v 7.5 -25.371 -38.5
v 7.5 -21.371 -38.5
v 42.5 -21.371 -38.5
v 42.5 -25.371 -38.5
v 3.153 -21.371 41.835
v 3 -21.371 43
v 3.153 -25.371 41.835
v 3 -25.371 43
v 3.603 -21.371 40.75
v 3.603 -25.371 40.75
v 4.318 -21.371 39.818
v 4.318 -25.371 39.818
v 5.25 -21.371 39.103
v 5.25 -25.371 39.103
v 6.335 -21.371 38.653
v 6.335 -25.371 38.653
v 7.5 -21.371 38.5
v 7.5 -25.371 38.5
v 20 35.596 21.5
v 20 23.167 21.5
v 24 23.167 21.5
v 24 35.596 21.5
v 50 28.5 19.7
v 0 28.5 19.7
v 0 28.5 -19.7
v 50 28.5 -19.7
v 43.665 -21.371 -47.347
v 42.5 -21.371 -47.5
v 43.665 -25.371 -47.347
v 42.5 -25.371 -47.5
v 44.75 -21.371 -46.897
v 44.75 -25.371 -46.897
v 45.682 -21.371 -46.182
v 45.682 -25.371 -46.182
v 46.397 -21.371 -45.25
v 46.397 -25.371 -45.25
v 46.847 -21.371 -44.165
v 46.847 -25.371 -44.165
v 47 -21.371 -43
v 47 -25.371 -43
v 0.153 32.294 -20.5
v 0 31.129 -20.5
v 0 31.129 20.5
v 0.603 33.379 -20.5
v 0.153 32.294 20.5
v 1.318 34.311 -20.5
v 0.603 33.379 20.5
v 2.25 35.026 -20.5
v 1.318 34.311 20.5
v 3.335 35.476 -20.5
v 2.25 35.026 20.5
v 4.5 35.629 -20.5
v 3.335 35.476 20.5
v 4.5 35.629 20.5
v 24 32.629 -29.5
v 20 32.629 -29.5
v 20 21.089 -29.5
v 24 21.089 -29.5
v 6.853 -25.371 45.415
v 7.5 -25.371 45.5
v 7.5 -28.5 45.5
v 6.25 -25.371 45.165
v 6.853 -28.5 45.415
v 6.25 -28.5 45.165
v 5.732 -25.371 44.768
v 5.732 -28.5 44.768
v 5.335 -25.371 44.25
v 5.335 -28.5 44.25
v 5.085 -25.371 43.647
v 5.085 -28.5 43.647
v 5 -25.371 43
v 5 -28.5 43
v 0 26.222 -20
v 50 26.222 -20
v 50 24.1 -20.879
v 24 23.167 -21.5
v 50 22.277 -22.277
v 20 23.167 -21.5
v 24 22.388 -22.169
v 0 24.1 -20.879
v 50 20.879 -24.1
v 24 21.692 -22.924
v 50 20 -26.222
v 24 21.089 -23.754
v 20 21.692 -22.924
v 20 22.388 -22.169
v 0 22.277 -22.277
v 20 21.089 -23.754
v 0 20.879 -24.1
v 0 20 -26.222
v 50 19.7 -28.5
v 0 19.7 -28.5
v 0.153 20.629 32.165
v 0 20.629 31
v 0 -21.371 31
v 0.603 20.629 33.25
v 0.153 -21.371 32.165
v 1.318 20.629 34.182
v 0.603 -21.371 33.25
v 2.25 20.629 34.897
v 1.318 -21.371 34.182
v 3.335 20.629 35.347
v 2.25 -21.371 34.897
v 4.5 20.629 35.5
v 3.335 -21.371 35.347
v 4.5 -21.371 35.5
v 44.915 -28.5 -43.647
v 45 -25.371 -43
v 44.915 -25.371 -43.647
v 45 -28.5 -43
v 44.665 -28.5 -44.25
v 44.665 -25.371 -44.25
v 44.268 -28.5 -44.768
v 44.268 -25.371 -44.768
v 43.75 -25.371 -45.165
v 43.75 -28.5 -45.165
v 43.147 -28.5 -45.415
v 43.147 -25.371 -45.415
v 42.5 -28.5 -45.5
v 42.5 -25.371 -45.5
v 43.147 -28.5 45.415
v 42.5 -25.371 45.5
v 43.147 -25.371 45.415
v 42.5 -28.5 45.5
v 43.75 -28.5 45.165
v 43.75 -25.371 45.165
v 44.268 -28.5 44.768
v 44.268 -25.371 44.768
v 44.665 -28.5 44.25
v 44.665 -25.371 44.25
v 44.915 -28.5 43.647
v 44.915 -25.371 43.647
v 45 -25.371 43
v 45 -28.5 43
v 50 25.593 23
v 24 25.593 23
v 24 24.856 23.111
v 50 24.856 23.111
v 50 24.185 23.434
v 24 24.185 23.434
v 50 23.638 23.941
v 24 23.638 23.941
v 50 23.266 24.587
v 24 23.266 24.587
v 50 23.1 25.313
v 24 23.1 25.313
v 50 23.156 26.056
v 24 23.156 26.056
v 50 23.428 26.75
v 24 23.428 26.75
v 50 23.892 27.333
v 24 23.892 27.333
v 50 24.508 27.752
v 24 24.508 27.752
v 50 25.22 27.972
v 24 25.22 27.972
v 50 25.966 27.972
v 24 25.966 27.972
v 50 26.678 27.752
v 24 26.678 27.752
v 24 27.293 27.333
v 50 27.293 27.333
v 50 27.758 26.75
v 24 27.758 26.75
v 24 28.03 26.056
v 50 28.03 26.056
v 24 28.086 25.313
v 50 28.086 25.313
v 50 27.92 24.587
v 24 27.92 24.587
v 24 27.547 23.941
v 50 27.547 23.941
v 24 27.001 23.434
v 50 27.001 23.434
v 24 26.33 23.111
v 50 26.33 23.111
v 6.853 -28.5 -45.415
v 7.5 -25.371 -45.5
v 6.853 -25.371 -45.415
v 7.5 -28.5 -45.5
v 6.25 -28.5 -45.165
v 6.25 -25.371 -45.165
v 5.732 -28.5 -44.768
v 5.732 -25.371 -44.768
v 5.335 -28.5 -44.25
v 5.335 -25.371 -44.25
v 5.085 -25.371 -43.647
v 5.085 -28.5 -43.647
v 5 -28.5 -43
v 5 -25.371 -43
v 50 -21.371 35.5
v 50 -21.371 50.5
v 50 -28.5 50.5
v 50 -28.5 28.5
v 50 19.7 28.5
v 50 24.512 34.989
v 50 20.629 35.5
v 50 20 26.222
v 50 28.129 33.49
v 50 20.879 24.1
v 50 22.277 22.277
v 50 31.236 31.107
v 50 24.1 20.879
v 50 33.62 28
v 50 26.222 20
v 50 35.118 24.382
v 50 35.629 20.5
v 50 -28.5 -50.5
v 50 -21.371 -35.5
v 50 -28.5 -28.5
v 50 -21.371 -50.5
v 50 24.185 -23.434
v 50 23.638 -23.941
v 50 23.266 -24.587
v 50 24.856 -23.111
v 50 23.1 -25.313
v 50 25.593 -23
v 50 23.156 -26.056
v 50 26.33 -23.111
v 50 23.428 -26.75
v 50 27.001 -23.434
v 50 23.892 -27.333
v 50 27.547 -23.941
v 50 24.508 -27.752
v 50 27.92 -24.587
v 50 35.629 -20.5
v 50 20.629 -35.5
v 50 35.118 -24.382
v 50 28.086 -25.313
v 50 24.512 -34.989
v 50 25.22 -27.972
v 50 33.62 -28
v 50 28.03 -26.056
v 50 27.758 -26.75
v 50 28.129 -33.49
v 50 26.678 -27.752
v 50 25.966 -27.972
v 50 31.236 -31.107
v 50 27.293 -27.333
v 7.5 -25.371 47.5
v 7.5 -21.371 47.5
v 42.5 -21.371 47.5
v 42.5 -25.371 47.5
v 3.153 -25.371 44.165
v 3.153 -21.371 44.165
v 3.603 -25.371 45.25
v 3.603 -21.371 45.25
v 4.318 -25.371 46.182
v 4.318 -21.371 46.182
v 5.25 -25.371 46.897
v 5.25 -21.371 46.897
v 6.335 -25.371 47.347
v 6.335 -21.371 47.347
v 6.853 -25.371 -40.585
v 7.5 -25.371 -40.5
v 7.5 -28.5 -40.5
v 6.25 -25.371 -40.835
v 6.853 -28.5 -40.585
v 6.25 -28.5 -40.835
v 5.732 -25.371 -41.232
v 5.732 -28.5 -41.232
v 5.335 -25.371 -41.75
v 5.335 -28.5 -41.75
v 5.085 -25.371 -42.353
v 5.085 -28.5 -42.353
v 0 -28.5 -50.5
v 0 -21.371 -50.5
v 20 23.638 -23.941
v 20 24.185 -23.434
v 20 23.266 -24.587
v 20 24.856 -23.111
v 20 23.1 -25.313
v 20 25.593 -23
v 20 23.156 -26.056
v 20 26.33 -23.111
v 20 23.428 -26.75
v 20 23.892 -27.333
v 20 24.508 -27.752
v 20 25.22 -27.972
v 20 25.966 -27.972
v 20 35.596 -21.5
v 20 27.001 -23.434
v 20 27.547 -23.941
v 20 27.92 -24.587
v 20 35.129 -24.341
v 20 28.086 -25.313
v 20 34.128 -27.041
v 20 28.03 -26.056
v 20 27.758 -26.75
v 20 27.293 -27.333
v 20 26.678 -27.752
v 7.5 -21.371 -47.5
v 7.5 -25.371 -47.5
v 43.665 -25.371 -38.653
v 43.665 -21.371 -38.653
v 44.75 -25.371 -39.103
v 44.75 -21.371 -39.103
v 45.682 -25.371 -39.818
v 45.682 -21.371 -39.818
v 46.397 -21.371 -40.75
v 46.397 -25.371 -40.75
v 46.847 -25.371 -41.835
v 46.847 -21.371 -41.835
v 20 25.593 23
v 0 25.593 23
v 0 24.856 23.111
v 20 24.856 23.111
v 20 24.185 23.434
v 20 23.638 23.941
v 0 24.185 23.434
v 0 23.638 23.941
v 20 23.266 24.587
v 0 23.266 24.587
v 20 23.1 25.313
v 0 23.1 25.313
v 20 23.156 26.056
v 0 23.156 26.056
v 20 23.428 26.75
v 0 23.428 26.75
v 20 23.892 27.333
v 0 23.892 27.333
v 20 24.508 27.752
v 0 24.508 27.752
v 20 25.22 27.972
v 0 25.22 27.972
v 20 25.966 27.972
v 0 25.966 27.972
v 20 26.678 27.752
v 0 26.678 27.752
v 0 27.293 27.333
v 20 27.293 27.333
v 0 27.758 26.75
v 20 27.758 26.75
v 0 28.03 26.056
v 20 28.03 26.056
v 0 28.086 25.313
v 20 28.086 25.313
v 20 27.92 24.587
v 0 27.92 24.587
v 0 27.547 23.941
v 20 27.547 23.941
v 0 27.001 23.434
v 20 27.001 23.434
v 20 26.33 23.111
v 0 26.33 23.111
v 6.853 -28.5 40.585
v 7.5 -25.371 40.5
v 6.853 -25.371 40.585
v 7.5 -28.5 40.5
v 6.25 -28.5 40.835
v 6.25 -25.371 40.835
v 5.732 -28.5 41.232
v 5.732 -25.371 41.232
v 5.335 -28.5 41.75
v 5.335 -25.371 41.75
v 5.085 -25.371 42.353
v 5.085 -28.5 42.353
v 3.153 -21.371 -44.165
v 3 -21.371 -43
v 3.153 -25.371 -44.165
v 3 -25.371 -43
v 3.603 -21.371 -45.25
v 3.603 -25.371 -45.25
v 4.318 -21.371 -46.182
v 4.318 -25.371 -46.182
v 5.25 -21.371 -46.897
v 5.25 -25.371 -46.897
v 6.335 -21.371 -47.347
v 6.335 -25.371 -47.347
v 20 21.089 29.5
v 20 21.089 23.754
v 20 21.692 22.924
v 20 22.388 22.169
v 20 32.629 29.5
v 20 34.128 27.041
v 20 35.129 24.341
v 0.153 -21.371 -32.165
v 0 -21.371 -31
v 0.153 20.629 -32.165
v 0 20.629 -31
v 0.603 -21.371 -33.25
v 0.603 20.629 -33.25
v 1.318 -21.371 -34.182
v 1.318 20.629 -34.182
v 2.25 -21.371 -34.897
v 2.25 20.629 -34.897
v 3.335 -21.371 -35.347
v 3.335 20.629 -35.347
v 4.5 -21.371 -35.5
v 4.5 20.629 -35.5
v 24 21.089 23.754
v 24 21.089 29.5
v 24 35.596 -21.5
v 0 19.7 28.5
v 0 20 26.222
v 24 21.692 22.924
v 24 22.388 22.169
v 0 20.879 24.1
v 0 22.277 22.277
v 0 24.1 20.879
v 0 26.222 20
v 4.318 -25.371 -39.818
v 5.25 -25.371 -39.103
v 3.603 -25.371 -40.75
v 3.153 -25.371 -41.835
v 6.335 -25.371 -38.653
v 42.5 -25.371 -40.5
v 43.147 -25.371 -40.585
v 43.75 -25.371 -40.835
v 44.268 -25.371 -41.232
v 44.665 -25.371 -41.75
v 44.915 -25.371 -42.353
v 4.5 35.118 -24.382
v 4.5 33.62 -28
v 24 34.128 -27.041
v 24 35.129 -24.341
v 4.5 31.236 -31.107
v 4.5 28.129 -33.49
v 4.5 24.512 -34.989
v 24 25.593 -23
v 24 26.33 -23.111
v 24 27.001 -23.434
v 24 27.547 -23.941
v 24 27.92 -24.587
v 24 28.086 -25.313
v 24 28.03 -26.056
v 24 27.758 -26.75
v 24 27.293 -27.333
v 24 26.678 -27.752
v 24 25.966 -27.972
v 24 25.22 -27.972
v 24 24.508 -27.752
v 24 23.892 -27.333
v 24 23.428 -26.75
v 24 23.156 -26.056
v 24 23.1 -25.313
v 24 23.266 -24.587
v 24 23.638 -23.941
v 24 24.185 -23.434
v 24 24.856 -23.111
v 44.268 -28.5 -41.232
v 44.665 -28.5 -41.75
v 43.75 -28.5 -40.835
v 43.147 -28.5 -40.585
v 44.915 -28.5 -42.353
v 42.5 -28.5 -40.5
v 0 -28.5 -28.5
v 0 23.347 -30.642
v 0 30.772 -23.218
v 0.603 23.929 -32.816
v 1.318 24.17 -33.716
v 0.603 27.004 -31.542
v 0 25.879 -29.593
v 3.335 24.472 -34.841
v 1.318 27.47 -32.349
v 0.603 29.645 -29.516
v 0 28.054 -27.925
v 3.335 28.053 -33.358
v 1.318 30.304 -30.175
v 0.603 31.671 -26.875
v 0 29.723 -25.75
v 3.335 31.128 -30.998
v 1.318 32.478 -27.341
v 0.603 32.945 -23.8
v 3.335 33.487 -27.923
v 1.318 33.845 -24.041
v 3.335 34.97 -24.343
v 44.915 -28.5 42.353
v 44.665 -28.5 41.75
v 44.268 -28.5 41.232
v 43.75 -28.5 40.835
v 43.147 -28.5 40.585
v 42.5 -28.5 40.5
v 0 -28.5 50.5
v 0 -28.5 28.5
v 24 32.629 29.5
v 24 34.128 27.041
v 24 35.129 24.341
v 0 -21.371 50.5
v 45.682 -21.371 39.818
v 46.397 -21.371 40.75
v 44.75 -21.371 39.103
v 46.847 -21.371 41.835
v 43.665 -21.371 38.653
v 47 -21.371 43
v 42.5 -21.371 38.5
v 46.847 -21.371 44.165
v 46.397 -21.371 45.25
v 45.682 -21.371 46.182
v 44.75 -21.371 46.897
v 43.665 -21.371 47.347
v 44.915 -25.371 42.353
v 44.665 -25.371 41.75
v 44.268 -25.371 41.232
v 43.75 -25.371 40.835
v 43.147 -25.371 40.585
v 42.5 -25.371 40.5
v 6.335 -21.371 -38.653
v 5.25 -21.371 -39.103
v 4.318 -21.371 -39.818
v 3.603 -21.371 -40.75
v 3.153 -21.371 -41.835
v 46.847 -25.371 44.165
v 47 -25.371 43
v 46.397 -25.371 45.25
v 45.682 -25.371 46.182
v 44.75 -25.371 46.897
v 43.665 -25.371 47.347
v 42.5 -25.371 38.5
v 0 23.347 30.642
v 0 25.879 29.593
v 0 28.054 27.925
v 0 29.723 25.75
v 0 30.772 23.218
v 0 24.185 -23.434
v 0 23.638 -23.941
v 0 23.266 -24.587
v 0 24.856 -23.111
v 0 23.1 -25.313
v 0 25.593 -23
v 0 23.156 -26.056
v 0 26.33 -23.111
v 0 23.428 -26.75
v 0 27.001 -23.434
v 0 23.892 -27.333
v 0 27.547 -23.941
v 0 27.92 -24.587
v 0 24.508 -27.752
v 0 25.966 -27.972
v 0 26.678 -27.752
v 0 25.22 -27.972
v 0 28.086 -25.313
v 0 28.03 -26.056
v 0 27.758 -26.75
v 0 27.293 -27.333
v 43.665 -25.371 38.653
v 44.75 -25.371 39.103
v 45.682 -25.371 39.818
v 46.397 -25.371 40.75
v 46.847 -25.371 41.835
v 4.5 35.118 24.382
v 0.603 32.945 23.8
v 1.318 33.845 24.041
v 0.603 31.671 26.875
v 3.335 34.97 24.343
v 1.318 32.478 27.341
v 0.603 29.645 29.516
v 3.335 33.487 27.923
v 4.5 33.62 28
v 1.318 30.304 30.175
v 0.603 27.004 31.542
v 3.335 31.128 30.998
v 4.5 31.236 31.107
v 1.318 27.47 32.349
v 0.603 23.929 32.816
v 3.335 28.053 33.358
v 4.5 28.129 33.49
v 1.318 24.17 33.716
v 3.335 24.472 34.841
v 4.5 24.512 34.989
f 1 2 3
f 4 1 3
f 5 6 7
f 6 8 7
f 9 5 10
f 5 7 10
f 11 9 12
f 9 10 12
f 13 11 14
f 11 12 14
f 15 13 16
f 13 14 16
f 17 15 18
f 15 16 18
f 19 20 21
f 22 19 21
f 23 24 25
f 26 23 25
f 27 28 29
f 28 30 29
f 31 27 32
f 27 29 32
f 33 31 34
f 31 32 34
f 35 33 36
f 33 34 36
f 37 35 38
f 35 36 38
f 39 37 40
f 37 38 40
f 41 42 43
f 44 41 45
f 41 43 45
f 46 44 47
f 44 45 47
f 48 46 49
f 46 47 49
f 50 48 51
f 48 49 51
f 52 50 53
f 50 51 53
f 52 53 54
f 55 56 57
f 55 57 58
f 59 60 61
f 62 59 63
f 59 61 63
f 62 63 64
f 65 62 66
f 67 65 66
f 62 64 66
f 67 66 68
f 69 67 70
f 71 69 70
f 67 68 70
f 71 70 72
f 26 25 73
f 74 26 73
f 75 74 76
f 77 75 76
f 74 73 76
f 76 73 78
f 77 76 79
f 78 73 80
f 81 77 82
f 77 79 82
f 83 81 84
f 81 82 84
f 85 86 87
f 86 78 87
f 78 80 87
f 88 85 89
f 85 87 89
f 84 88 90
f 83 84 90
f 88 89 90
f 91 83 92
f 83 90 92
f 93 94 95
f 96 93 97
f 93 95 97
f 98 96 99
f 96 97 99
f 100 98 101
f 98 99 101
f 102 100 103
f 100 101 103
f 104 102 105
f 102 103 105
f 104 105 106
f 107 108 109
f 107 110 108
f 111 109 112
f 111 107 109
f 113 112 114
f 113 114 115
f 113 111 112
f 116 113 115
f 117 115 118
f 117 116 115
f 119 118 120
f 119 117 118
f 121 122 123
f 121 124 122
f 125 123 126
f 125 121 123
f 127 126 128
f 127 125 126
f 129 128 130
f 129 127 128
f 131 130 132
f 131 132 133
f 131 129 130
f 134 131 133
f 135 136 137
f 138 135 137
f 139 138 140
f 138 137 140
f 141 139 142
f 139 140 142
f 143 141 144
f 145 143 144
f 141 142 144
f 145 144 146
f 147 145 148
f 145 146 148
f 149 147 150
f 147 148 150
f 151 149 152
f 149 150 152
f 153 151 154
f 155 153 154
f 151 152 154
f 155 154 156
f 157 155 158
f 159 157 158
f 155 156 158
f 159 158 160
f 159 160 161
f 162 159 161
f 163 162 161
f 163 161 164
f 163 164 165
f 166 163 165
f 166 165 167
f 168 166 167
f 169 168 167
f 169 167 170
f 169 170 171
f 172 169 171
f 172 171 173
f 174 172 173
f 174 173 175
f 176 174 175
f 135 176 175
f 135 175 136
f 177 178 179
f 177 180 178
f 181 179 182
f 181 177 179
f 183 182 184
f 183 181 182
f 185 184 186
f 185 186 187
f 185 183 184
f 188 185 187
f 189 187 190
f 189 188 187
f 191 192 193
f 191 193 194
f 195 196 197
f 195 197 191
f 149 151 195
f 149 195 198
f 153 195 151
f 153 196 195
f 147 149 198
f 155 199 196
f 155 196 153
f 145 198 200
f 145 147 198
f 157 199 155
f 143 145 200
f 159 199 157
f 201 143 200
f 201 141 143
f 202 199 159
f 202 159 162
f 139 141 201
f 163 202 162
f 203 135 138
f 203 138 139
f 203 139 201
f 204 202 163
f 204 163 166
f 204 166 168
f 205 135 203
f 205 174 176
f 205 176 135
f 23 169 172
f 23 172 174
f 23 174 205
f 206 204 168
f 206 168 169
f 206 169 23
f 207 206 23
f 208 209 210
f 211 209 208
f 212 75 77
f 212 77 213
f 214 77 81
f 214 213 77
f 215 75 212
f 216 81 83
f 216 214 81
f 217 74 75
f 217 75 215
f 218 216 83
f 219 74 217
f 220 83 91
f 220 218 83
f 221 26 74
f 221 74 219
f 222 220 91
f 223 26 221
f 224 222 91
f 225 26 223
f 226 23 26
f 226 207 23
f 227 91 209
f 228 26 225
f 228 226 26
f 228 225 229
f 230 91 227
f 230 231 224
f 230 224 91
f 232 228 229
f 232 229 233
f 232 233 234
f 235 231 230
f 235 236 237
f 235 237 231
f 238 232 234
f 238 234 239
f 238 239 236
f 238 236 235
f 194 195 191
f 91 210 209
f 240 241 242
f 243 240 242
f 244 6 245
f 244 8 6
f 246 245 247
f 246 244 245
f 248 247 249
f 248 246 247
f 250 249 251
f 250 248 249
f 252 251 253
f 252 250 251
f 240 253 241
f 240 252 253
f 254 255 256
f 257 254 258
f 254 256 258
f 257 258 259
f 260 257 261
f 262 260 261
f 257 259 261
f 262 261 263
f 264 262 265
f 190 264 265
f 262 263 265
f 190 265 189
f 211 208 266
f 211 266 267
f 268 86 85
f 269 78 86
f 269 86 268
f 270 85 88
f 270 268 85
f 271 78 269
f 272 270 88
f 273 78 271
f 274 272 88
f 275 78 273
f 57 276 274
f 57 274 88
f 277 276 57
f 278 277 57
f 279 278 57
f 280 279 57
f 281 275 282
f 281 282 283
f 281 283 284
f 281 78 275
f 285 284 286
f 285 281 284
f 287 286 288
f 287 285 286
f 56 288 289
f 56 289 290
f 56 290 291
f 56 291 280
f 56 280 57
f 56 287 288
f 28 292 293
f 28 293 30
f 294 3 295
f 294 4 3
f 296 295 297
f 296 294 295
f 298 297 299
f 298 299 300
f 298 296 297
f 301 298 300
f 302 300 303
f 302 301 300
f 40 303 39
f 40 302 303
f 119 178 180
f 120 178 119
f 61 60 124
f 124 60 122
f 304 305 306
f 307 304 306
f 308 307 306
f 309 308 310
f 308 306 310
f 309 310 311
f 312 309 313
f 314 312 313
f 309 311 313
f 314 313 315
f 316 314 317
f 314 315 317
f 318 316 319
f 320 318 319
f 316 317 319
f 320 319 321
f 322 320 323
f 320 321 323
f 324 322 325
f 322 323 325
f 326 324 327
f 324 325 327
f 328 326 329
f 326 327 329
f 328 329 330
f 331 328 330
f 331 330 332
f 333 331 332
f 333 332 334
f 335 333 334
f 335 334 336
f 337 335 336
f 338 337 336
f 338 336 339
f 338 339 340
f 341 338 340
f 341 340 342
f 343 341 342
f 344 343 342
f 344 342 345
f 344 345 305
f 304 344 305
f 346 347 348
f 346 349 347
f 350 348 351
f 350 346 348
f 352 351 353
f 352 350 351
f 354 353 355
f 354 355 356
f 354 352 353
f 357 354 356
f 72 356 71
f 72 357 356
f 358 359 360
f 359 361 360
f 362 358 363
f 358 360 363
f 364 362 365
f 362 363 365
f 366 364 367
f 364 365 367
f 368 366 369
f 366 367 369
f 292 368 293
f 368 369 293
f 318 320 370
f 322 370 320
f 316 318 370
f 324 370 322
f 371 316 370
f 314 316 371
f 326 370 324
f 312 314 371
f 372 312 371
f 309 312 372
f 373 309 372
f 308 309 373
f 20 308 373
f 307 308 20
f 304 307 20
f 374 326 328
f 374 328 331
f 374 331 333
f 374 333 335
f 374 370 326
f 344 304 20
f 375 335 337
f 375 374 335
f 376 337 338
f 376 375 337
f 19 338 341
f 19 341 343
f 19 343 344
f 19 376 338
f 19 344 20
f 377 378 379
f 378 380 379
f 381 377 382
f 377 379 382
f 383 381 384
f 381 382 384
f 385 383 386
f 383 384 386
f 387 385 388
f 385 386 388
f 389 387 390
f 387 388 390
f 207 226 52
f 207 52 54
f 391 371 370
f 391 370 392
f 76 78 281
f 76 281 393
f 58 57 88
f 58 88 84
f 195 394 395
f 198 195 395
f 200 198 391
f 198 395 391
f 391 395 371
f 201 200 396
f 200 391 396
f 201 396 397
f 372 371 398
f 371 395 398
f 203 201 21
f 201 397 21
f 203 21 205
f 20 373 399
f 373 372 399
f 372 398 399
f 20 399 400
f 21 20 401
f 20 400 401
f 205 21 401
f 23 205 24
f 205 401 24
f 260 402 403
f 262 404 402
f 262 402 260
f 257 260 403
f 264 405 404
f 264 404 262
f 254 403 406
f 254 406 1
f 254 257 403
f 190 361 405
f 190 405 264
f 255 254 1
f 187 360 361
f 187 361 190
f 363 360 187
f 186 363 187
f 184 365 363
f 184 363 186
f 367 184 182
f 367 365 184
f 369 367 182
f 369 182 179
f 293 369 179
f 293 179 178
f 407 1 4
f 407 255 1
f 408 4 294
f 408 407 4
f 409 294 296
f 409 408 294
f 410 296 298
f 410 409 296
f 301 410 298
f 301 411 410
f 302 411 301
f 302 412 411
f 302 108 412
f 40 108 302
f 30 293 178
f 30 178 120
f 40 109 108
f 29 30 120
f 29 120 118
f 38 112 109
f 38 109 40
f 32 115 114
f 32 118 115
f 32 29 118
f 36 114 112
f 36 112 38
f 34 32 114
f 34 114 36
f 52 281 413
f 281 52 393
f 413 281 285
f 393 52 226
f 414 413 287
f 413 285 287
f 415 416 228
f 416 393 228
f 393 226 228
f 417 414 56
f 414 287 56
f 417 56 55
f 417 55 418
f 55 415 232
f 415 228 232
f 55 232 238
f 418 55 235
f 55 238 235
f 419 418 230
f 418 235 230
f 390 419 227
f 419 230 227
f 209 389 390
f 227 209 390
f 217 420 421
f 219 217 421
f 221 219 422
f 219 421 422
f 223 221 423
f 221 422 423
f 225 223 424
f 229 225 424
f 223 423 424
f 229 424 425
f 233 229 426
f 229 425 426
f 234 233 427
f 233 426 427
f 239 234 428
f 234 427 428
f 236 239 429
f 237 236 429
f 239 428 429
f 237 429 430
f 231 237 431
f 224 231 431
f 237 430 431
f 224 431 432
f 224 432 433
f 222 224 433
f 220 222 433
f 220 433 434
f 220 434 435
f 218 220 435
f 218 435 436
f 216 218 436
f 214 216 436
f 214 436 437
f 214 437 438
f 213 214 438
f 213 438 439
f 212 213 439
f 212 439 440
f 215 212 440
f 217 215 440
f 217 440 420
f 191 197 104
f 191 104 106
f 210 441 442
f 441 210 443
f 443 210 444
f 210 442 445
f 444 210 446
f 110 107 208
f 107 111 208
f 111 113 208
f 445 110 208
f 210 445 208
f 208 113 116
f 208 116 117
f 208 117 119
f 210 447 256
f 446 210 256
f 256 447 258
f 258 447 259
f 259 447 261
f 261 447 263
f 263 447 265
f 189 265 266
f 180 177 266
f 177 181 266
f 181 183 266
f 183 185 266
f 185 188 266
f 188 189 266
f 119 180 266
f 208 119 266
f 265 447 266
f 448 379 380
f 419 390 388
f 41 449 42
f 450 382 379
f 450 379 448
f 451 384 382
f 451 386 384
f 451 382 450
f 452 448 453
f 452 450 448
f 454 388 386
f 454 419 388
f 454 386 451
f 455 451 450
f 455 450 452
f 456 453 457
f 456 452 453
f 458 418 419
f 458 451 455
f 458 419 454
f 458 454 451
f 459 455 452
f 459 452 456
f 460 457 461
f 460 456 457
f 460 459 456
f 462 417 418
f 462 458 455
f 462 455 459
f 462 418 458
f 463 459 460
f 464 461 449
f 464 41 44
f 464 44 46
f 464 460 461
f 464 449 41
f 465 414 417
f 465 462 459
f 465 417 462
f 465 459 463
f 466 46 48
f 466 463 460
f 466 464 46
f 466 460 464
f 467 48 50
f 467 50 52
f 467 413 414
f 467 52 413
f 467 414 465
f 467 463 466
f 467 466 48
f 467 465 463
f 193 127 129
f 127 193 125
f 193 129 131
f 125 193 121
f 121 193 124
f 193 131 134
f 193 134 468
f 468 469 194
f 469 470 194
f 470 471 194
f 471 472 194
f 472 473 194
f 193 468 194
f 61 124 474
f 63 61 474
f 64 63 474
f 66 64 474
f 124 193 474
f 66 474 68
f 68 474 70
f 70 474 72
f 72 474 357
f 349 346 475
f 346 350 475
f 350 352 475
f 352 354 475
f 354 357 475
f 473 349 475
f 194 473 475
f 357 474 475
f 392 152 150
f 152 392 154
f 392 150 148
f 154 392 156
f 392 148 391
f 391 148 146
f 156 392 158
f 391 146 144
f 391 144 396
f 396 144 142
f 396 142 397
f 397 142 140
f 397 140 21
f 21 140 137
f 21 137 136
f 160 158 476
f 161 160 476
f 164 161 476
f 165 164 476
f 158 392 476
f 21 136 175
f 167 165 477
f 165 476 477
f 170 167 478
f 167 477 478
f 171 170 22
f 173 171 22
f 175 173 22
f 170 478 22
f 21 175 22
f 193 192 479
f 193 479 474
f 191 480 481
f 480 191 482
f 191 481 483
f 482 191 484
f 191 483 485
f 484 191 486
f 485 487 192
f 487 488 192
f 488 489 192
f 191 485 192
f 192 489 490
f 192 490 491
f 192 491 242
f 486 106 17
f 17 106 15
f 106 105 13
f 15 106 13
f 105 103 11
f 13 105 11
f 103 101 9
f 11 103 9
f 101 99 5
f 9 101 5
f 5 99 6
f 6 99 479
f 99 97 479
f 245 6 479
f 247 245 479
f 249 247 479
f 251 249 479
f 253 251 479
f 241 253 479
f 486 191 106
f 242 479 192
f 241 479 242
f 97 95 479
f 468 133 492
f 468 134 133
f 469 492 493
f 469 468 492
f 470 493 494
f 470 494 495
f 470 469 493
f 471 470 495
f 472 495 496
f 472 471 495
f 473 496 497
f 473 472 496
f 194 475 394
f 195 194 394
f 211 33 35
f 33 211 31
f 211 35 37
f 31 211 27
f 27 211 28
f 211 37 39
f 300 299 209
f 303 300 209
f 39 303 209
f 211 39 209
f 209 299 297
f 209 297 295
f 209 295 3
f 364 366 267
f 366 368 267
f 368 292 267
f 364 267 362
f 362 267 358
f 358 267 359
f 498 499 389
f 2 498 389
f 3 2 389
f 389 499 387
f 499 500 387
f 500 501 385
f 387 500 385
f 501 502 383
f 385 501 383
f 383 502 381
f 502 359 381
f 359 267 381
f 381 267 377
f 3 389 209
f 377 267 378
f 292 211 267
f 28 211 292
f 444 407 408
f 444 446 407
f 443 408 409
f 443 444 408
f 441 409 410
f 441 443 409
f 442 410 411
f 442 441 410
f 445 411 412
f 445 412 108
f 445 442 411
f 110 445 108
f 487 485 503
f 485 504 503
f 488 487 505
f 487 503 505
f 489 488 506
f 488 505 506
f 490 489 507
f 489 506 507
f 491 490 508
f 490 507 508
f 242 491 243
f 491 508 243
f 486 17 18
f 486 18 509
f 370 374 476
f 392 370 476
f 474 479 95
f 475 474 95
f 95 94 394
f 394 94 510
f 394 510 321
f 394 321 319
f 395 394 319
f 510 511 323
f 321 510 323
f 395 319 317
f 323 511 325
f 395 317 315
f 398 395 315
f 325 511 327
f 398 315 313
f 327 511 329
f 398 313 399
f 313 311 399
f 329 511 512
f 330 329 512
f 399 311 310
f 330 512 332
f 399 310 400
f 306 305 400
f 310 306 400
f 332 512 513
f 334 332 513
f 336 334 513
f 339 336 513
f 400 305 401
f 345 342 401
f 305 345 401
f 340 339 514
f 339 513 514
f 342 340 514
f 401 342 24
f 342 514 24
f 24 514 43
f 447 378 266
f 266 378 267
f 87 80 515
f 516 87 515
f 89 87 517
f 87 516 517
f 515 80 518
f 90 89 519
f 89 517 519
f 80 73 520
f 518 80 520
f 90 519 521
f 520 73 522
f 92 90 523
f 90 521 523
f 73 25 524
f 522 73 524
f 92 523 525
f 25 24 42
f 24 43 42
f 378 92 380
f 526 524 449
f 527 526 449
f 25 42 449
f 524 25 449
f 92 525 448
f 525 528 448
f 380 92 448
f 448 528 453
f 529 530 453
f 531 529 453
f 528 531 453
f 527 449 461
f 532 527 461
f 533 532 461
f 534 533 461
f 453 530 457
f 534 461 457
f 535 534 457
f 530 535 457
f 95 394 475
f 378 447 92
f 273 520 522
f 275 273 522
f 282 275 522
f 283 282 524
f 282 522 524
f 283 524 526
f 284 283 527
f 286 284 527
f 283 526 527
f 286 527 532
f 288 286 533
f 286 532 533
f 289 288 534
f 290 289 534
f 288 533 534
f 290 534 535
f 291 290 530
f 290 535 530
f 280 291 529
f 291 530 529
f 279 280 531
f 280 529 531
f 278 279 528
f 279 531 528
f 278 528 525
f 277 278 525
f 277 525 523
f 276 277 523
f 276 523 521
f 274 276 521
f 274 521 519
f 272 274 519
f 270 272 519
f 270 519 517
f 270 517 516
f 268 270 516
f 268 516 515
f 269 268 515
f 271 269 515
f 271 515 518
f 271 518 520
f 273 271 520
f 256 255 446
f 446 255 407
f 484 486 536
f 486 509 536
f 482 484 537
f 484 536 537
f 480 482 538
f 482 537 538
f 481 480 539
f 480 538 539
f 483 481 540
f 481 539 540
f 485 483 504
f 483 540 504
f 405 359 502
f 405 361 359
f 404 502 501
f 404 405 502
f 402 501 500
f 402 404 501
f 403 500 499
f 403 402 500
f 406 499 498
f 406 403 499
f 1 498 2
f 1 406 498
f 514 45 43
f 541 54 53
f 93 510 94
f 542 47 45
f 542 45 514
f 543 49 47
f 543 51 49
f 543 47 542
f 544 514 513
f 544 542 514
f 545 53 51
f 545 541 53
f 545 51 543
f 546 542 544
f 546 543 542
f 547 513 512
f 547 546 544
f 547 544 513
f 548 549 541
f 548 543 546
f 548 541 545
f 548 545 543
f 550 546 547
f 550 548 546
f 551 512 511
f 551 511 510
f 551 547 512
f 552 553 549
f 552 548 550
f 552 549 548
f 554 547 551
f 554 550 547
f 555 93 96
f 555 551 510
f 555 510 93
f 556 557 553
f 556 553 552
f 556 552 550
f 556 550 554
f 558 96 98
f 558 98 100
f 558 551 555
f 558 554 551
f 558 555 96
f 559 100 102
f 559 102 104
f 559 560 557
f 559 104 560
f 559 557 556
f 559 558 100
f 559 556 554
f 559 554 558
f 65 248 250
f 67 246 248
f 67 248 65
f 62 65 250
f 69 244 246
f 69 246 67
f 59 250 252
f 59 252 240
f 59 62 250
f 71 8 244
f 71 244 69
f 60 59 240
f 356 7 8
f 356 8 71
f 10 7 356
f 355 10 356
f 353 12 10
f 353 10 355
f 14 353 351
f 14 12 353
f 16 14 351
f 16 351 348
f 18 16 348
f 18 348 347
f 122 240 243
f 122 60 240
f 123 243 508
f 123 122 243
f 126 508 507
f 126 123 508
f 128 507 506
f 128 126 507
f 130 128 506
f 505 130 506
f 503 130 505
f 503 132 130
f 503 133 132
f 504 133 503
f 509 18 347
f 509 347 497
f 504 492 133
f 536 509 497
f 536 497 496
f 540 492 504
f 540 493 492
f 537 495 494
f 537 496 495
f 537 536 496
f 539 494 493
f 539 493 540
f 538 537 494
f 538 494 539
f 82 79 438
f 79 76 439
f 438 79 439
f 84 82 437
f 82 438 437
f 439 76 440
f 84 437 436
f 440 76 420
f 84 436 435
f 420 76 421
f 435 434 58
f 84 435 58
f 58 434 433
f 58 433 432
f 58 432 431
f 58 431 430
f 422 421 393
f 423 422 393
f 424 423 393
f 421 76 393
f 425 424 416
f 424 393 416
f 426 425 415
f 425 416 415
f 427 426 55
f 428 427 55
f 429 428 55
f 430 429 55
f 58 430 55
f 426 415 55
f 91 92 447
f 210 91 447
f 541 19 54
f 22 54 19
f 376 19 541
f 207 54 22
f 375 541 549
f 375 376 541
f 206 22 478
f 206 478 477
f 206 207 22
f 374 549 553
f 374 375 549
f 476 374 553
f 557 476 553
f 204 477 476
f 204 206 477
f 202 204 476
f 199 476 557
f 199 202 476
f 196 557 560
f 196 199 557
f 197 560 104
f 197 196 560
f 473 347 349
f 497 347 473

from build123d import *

# Parameters (mm, degrees)
BOSS_EXTRUDE1_DEPTH = 50
SKETCH2_R           = 2.5
CUT_EXTRUDE1_DEPTH  = 50
FILLET1_R           = 15
SKETCH3_W           = 4
SKETCH3_H           = 8
CUT_EXTRUDE2_DEPTH  = 14.54
SKETCH4_W           = 44
SKETCH4_H           = 9
CUT_EXTRUDE3_DEPTH  = 4
SKETCH5_W           = 40
SKETCH5_H           = 5
CUT_EXTRUDE4_DEPTH  = 94.654951818
FILLET2_R           = 2.5
FILLET3_R           = 4.5
FILLET4_R           = 4.5


with BuildPart() as part:
    # Sketch1 → Boss-Extrude1 (new body)
    with BuildSketch(Plane(origin=(0, 0, 0), x_dir=(0, 0, -1), z_dir=(1, 0, 0))):
        with BuildLine():
            Line((35.5, 35.62933491), (-35.5, 35.62933491))
            Line((-35.5, 35.62933491), (-35.5, -21.37066509))
            Line((-35.5, -21.37066509), (-50.5, -21.37066509))
            Line((-50.5, -21.37066509), (-50.5, -28.5))
            Line((-50.5, -28.5), (-28.5, -28.5))
            Line((-28.5, -28.5), (-28.5, 19.7))
            ThreePointArc((-28.5, 19.7), (-22.277460326, 22.277460326), (-19.7, 28.5))
            Line((-19.7, 28.5), (19.7, 28.5))
            ThreePointArc((19.7, 28.5), (22.277460326, 22.277460326), (28.5, 19.7))
            Line((28.5, 19.7), (28.5, -28.5))
            Line((28.5, -28.5), (50.5, -28.5))
            Line((50.5, -28.5), (50.5, -21.37066509))
            Line((50.5, -21.37066509), (35.5, -21.37066509))
            Line((35.5, -21.37066509), (35.5, 35.62933491))
        make_face()
    extrude(amount=BOSS_EXTRUDE1_DEPTH)

    # Sketch2 → Cut-Extrude1 (cut)
    with BuildSketch(Plane.ZY):
        with Locations((-25.5, 25.592902541)):
            Circle(SKETCH2_R)
        with Locations(Location((25.5, 25.592902541, 0), (0, 0, 180))):
            Circle(SKETCH2_R)
    extrude(amount=-CUT_EXTRUDE1_DEPTH, mode=Mode.SUBTRACT)

    # Fillet1
    fillet1_edges = [part.edges().sort_by_distance(p)[0] for p in [
        (25, 35.62933491, 35.5),
        (25, 35.62933491, -35.5),
    ]]
    fillet(fillet1_edges, radius=FILLET1_R)

    # Sketch3 → Cut-Extrude2 (cut)
    with BuildSketch(Plane(origin=(0, 35.62933491, 0), x_dir=(1, 0, 0), z_dir=(0, 1, 0))):
        with Locations((22, 25.5)):
            Rectangle(SKETCH3_W, SKETCH3_H)
        with Locations((22, -25.5)):
            Rectangle(SKETCH3_W, SKETCH3_H)
    extrude(amount=-CUT_EXTRUDE2_DEPTH, mode=Mode.SUBTRACT)

    # Sketch4 → Cut-Extrude3 (cut)
    with BuildSketch(Plane(origin=(0, -21.37066509, 0), x_dir=(1, 0, 0), z_dir=(0, 1, 0))):
        with Locations((25, -43)):
            Rectangle(SKETCH4_W, SKETCH4_H)
        with Locations((25, 43)):
            Rectangle(SKETCH4_W, SKETCH4_H)
    extrude(amount=-CUT_EXTRUDE3_DEPTH, mode=Mode.SUBTRACT)

    # Sketch5 → Cut-Extrude4 (cut, through all)
    with BuildSketch(Plane(origin=(0, -25.37066509, 0), x_dir=(1, 0, 0), z_dir=(0, 1, 0))):
        with Locations((25, -43)):
            Rectangle(SKETCH5_W, SKETCH5_H)
        with Locations((25, 43)):
            Rectangle(SKETCH5_W, SKETCH5_H)
    extrude(amount=-CUT_EXTRUDE4_DEPTH, mode=Mode.SUBTRACT)

    # Fillet2
    fillet2_edges = [part.edges().sort_by_distance(p)[0] for p in [
        (45, -26.935332545, 40.5),
        (45, -26.935332545, 45.5),
        (5, -26.935332545, 45.5),
        (5, -26.935332545, 40.5),
        (5, -26.935332545, -45.5),
        (5, -26.935332545, -40.5),
        (45, -26.935332545, -45.5),
        (45, -26.935332545, -40.5),
    ]]
    fillet(fillet2_edges, radius=FILLET2_R - 0.0001)  # a hair under: the kernel refuses the full size

    # Fillet3
    fillet3_edges = [part.edges().sort_by_distance(p)[0] for p in [
        (3, -23.37066509, 38.5),
        (3, -23.37066509, 47.5),
        (47, -23.37066509, 47.5),
        (47, -23.37066509, 38.5),
        (47, -23.37066509, -47.5),
        (47, -23.37066509, -38.5),
        (3, -23.37066509, -47.5),
        (3, -23.37066509, -38.5),
    ]]
    fillet(fillet3_edges, radius=FILLET3_R - 0.0001)  # a hair under: the kernel refuses the full size

    # Fillet4
    fillet4_edges = [part.edges().sort_by_distance(p)[0] for p in [
        (0, -0.37066509, -35.5),
        (0, -0.37066509, 35.5),
        (0, 35.62933491, 0),
        (0, 31.235936628, -31.106601718),
        (0, 31.235936628, 31.106601718),
    ]]
    fillet(fillet4_edges, radius=FILLET4_R)


solid = part.part
